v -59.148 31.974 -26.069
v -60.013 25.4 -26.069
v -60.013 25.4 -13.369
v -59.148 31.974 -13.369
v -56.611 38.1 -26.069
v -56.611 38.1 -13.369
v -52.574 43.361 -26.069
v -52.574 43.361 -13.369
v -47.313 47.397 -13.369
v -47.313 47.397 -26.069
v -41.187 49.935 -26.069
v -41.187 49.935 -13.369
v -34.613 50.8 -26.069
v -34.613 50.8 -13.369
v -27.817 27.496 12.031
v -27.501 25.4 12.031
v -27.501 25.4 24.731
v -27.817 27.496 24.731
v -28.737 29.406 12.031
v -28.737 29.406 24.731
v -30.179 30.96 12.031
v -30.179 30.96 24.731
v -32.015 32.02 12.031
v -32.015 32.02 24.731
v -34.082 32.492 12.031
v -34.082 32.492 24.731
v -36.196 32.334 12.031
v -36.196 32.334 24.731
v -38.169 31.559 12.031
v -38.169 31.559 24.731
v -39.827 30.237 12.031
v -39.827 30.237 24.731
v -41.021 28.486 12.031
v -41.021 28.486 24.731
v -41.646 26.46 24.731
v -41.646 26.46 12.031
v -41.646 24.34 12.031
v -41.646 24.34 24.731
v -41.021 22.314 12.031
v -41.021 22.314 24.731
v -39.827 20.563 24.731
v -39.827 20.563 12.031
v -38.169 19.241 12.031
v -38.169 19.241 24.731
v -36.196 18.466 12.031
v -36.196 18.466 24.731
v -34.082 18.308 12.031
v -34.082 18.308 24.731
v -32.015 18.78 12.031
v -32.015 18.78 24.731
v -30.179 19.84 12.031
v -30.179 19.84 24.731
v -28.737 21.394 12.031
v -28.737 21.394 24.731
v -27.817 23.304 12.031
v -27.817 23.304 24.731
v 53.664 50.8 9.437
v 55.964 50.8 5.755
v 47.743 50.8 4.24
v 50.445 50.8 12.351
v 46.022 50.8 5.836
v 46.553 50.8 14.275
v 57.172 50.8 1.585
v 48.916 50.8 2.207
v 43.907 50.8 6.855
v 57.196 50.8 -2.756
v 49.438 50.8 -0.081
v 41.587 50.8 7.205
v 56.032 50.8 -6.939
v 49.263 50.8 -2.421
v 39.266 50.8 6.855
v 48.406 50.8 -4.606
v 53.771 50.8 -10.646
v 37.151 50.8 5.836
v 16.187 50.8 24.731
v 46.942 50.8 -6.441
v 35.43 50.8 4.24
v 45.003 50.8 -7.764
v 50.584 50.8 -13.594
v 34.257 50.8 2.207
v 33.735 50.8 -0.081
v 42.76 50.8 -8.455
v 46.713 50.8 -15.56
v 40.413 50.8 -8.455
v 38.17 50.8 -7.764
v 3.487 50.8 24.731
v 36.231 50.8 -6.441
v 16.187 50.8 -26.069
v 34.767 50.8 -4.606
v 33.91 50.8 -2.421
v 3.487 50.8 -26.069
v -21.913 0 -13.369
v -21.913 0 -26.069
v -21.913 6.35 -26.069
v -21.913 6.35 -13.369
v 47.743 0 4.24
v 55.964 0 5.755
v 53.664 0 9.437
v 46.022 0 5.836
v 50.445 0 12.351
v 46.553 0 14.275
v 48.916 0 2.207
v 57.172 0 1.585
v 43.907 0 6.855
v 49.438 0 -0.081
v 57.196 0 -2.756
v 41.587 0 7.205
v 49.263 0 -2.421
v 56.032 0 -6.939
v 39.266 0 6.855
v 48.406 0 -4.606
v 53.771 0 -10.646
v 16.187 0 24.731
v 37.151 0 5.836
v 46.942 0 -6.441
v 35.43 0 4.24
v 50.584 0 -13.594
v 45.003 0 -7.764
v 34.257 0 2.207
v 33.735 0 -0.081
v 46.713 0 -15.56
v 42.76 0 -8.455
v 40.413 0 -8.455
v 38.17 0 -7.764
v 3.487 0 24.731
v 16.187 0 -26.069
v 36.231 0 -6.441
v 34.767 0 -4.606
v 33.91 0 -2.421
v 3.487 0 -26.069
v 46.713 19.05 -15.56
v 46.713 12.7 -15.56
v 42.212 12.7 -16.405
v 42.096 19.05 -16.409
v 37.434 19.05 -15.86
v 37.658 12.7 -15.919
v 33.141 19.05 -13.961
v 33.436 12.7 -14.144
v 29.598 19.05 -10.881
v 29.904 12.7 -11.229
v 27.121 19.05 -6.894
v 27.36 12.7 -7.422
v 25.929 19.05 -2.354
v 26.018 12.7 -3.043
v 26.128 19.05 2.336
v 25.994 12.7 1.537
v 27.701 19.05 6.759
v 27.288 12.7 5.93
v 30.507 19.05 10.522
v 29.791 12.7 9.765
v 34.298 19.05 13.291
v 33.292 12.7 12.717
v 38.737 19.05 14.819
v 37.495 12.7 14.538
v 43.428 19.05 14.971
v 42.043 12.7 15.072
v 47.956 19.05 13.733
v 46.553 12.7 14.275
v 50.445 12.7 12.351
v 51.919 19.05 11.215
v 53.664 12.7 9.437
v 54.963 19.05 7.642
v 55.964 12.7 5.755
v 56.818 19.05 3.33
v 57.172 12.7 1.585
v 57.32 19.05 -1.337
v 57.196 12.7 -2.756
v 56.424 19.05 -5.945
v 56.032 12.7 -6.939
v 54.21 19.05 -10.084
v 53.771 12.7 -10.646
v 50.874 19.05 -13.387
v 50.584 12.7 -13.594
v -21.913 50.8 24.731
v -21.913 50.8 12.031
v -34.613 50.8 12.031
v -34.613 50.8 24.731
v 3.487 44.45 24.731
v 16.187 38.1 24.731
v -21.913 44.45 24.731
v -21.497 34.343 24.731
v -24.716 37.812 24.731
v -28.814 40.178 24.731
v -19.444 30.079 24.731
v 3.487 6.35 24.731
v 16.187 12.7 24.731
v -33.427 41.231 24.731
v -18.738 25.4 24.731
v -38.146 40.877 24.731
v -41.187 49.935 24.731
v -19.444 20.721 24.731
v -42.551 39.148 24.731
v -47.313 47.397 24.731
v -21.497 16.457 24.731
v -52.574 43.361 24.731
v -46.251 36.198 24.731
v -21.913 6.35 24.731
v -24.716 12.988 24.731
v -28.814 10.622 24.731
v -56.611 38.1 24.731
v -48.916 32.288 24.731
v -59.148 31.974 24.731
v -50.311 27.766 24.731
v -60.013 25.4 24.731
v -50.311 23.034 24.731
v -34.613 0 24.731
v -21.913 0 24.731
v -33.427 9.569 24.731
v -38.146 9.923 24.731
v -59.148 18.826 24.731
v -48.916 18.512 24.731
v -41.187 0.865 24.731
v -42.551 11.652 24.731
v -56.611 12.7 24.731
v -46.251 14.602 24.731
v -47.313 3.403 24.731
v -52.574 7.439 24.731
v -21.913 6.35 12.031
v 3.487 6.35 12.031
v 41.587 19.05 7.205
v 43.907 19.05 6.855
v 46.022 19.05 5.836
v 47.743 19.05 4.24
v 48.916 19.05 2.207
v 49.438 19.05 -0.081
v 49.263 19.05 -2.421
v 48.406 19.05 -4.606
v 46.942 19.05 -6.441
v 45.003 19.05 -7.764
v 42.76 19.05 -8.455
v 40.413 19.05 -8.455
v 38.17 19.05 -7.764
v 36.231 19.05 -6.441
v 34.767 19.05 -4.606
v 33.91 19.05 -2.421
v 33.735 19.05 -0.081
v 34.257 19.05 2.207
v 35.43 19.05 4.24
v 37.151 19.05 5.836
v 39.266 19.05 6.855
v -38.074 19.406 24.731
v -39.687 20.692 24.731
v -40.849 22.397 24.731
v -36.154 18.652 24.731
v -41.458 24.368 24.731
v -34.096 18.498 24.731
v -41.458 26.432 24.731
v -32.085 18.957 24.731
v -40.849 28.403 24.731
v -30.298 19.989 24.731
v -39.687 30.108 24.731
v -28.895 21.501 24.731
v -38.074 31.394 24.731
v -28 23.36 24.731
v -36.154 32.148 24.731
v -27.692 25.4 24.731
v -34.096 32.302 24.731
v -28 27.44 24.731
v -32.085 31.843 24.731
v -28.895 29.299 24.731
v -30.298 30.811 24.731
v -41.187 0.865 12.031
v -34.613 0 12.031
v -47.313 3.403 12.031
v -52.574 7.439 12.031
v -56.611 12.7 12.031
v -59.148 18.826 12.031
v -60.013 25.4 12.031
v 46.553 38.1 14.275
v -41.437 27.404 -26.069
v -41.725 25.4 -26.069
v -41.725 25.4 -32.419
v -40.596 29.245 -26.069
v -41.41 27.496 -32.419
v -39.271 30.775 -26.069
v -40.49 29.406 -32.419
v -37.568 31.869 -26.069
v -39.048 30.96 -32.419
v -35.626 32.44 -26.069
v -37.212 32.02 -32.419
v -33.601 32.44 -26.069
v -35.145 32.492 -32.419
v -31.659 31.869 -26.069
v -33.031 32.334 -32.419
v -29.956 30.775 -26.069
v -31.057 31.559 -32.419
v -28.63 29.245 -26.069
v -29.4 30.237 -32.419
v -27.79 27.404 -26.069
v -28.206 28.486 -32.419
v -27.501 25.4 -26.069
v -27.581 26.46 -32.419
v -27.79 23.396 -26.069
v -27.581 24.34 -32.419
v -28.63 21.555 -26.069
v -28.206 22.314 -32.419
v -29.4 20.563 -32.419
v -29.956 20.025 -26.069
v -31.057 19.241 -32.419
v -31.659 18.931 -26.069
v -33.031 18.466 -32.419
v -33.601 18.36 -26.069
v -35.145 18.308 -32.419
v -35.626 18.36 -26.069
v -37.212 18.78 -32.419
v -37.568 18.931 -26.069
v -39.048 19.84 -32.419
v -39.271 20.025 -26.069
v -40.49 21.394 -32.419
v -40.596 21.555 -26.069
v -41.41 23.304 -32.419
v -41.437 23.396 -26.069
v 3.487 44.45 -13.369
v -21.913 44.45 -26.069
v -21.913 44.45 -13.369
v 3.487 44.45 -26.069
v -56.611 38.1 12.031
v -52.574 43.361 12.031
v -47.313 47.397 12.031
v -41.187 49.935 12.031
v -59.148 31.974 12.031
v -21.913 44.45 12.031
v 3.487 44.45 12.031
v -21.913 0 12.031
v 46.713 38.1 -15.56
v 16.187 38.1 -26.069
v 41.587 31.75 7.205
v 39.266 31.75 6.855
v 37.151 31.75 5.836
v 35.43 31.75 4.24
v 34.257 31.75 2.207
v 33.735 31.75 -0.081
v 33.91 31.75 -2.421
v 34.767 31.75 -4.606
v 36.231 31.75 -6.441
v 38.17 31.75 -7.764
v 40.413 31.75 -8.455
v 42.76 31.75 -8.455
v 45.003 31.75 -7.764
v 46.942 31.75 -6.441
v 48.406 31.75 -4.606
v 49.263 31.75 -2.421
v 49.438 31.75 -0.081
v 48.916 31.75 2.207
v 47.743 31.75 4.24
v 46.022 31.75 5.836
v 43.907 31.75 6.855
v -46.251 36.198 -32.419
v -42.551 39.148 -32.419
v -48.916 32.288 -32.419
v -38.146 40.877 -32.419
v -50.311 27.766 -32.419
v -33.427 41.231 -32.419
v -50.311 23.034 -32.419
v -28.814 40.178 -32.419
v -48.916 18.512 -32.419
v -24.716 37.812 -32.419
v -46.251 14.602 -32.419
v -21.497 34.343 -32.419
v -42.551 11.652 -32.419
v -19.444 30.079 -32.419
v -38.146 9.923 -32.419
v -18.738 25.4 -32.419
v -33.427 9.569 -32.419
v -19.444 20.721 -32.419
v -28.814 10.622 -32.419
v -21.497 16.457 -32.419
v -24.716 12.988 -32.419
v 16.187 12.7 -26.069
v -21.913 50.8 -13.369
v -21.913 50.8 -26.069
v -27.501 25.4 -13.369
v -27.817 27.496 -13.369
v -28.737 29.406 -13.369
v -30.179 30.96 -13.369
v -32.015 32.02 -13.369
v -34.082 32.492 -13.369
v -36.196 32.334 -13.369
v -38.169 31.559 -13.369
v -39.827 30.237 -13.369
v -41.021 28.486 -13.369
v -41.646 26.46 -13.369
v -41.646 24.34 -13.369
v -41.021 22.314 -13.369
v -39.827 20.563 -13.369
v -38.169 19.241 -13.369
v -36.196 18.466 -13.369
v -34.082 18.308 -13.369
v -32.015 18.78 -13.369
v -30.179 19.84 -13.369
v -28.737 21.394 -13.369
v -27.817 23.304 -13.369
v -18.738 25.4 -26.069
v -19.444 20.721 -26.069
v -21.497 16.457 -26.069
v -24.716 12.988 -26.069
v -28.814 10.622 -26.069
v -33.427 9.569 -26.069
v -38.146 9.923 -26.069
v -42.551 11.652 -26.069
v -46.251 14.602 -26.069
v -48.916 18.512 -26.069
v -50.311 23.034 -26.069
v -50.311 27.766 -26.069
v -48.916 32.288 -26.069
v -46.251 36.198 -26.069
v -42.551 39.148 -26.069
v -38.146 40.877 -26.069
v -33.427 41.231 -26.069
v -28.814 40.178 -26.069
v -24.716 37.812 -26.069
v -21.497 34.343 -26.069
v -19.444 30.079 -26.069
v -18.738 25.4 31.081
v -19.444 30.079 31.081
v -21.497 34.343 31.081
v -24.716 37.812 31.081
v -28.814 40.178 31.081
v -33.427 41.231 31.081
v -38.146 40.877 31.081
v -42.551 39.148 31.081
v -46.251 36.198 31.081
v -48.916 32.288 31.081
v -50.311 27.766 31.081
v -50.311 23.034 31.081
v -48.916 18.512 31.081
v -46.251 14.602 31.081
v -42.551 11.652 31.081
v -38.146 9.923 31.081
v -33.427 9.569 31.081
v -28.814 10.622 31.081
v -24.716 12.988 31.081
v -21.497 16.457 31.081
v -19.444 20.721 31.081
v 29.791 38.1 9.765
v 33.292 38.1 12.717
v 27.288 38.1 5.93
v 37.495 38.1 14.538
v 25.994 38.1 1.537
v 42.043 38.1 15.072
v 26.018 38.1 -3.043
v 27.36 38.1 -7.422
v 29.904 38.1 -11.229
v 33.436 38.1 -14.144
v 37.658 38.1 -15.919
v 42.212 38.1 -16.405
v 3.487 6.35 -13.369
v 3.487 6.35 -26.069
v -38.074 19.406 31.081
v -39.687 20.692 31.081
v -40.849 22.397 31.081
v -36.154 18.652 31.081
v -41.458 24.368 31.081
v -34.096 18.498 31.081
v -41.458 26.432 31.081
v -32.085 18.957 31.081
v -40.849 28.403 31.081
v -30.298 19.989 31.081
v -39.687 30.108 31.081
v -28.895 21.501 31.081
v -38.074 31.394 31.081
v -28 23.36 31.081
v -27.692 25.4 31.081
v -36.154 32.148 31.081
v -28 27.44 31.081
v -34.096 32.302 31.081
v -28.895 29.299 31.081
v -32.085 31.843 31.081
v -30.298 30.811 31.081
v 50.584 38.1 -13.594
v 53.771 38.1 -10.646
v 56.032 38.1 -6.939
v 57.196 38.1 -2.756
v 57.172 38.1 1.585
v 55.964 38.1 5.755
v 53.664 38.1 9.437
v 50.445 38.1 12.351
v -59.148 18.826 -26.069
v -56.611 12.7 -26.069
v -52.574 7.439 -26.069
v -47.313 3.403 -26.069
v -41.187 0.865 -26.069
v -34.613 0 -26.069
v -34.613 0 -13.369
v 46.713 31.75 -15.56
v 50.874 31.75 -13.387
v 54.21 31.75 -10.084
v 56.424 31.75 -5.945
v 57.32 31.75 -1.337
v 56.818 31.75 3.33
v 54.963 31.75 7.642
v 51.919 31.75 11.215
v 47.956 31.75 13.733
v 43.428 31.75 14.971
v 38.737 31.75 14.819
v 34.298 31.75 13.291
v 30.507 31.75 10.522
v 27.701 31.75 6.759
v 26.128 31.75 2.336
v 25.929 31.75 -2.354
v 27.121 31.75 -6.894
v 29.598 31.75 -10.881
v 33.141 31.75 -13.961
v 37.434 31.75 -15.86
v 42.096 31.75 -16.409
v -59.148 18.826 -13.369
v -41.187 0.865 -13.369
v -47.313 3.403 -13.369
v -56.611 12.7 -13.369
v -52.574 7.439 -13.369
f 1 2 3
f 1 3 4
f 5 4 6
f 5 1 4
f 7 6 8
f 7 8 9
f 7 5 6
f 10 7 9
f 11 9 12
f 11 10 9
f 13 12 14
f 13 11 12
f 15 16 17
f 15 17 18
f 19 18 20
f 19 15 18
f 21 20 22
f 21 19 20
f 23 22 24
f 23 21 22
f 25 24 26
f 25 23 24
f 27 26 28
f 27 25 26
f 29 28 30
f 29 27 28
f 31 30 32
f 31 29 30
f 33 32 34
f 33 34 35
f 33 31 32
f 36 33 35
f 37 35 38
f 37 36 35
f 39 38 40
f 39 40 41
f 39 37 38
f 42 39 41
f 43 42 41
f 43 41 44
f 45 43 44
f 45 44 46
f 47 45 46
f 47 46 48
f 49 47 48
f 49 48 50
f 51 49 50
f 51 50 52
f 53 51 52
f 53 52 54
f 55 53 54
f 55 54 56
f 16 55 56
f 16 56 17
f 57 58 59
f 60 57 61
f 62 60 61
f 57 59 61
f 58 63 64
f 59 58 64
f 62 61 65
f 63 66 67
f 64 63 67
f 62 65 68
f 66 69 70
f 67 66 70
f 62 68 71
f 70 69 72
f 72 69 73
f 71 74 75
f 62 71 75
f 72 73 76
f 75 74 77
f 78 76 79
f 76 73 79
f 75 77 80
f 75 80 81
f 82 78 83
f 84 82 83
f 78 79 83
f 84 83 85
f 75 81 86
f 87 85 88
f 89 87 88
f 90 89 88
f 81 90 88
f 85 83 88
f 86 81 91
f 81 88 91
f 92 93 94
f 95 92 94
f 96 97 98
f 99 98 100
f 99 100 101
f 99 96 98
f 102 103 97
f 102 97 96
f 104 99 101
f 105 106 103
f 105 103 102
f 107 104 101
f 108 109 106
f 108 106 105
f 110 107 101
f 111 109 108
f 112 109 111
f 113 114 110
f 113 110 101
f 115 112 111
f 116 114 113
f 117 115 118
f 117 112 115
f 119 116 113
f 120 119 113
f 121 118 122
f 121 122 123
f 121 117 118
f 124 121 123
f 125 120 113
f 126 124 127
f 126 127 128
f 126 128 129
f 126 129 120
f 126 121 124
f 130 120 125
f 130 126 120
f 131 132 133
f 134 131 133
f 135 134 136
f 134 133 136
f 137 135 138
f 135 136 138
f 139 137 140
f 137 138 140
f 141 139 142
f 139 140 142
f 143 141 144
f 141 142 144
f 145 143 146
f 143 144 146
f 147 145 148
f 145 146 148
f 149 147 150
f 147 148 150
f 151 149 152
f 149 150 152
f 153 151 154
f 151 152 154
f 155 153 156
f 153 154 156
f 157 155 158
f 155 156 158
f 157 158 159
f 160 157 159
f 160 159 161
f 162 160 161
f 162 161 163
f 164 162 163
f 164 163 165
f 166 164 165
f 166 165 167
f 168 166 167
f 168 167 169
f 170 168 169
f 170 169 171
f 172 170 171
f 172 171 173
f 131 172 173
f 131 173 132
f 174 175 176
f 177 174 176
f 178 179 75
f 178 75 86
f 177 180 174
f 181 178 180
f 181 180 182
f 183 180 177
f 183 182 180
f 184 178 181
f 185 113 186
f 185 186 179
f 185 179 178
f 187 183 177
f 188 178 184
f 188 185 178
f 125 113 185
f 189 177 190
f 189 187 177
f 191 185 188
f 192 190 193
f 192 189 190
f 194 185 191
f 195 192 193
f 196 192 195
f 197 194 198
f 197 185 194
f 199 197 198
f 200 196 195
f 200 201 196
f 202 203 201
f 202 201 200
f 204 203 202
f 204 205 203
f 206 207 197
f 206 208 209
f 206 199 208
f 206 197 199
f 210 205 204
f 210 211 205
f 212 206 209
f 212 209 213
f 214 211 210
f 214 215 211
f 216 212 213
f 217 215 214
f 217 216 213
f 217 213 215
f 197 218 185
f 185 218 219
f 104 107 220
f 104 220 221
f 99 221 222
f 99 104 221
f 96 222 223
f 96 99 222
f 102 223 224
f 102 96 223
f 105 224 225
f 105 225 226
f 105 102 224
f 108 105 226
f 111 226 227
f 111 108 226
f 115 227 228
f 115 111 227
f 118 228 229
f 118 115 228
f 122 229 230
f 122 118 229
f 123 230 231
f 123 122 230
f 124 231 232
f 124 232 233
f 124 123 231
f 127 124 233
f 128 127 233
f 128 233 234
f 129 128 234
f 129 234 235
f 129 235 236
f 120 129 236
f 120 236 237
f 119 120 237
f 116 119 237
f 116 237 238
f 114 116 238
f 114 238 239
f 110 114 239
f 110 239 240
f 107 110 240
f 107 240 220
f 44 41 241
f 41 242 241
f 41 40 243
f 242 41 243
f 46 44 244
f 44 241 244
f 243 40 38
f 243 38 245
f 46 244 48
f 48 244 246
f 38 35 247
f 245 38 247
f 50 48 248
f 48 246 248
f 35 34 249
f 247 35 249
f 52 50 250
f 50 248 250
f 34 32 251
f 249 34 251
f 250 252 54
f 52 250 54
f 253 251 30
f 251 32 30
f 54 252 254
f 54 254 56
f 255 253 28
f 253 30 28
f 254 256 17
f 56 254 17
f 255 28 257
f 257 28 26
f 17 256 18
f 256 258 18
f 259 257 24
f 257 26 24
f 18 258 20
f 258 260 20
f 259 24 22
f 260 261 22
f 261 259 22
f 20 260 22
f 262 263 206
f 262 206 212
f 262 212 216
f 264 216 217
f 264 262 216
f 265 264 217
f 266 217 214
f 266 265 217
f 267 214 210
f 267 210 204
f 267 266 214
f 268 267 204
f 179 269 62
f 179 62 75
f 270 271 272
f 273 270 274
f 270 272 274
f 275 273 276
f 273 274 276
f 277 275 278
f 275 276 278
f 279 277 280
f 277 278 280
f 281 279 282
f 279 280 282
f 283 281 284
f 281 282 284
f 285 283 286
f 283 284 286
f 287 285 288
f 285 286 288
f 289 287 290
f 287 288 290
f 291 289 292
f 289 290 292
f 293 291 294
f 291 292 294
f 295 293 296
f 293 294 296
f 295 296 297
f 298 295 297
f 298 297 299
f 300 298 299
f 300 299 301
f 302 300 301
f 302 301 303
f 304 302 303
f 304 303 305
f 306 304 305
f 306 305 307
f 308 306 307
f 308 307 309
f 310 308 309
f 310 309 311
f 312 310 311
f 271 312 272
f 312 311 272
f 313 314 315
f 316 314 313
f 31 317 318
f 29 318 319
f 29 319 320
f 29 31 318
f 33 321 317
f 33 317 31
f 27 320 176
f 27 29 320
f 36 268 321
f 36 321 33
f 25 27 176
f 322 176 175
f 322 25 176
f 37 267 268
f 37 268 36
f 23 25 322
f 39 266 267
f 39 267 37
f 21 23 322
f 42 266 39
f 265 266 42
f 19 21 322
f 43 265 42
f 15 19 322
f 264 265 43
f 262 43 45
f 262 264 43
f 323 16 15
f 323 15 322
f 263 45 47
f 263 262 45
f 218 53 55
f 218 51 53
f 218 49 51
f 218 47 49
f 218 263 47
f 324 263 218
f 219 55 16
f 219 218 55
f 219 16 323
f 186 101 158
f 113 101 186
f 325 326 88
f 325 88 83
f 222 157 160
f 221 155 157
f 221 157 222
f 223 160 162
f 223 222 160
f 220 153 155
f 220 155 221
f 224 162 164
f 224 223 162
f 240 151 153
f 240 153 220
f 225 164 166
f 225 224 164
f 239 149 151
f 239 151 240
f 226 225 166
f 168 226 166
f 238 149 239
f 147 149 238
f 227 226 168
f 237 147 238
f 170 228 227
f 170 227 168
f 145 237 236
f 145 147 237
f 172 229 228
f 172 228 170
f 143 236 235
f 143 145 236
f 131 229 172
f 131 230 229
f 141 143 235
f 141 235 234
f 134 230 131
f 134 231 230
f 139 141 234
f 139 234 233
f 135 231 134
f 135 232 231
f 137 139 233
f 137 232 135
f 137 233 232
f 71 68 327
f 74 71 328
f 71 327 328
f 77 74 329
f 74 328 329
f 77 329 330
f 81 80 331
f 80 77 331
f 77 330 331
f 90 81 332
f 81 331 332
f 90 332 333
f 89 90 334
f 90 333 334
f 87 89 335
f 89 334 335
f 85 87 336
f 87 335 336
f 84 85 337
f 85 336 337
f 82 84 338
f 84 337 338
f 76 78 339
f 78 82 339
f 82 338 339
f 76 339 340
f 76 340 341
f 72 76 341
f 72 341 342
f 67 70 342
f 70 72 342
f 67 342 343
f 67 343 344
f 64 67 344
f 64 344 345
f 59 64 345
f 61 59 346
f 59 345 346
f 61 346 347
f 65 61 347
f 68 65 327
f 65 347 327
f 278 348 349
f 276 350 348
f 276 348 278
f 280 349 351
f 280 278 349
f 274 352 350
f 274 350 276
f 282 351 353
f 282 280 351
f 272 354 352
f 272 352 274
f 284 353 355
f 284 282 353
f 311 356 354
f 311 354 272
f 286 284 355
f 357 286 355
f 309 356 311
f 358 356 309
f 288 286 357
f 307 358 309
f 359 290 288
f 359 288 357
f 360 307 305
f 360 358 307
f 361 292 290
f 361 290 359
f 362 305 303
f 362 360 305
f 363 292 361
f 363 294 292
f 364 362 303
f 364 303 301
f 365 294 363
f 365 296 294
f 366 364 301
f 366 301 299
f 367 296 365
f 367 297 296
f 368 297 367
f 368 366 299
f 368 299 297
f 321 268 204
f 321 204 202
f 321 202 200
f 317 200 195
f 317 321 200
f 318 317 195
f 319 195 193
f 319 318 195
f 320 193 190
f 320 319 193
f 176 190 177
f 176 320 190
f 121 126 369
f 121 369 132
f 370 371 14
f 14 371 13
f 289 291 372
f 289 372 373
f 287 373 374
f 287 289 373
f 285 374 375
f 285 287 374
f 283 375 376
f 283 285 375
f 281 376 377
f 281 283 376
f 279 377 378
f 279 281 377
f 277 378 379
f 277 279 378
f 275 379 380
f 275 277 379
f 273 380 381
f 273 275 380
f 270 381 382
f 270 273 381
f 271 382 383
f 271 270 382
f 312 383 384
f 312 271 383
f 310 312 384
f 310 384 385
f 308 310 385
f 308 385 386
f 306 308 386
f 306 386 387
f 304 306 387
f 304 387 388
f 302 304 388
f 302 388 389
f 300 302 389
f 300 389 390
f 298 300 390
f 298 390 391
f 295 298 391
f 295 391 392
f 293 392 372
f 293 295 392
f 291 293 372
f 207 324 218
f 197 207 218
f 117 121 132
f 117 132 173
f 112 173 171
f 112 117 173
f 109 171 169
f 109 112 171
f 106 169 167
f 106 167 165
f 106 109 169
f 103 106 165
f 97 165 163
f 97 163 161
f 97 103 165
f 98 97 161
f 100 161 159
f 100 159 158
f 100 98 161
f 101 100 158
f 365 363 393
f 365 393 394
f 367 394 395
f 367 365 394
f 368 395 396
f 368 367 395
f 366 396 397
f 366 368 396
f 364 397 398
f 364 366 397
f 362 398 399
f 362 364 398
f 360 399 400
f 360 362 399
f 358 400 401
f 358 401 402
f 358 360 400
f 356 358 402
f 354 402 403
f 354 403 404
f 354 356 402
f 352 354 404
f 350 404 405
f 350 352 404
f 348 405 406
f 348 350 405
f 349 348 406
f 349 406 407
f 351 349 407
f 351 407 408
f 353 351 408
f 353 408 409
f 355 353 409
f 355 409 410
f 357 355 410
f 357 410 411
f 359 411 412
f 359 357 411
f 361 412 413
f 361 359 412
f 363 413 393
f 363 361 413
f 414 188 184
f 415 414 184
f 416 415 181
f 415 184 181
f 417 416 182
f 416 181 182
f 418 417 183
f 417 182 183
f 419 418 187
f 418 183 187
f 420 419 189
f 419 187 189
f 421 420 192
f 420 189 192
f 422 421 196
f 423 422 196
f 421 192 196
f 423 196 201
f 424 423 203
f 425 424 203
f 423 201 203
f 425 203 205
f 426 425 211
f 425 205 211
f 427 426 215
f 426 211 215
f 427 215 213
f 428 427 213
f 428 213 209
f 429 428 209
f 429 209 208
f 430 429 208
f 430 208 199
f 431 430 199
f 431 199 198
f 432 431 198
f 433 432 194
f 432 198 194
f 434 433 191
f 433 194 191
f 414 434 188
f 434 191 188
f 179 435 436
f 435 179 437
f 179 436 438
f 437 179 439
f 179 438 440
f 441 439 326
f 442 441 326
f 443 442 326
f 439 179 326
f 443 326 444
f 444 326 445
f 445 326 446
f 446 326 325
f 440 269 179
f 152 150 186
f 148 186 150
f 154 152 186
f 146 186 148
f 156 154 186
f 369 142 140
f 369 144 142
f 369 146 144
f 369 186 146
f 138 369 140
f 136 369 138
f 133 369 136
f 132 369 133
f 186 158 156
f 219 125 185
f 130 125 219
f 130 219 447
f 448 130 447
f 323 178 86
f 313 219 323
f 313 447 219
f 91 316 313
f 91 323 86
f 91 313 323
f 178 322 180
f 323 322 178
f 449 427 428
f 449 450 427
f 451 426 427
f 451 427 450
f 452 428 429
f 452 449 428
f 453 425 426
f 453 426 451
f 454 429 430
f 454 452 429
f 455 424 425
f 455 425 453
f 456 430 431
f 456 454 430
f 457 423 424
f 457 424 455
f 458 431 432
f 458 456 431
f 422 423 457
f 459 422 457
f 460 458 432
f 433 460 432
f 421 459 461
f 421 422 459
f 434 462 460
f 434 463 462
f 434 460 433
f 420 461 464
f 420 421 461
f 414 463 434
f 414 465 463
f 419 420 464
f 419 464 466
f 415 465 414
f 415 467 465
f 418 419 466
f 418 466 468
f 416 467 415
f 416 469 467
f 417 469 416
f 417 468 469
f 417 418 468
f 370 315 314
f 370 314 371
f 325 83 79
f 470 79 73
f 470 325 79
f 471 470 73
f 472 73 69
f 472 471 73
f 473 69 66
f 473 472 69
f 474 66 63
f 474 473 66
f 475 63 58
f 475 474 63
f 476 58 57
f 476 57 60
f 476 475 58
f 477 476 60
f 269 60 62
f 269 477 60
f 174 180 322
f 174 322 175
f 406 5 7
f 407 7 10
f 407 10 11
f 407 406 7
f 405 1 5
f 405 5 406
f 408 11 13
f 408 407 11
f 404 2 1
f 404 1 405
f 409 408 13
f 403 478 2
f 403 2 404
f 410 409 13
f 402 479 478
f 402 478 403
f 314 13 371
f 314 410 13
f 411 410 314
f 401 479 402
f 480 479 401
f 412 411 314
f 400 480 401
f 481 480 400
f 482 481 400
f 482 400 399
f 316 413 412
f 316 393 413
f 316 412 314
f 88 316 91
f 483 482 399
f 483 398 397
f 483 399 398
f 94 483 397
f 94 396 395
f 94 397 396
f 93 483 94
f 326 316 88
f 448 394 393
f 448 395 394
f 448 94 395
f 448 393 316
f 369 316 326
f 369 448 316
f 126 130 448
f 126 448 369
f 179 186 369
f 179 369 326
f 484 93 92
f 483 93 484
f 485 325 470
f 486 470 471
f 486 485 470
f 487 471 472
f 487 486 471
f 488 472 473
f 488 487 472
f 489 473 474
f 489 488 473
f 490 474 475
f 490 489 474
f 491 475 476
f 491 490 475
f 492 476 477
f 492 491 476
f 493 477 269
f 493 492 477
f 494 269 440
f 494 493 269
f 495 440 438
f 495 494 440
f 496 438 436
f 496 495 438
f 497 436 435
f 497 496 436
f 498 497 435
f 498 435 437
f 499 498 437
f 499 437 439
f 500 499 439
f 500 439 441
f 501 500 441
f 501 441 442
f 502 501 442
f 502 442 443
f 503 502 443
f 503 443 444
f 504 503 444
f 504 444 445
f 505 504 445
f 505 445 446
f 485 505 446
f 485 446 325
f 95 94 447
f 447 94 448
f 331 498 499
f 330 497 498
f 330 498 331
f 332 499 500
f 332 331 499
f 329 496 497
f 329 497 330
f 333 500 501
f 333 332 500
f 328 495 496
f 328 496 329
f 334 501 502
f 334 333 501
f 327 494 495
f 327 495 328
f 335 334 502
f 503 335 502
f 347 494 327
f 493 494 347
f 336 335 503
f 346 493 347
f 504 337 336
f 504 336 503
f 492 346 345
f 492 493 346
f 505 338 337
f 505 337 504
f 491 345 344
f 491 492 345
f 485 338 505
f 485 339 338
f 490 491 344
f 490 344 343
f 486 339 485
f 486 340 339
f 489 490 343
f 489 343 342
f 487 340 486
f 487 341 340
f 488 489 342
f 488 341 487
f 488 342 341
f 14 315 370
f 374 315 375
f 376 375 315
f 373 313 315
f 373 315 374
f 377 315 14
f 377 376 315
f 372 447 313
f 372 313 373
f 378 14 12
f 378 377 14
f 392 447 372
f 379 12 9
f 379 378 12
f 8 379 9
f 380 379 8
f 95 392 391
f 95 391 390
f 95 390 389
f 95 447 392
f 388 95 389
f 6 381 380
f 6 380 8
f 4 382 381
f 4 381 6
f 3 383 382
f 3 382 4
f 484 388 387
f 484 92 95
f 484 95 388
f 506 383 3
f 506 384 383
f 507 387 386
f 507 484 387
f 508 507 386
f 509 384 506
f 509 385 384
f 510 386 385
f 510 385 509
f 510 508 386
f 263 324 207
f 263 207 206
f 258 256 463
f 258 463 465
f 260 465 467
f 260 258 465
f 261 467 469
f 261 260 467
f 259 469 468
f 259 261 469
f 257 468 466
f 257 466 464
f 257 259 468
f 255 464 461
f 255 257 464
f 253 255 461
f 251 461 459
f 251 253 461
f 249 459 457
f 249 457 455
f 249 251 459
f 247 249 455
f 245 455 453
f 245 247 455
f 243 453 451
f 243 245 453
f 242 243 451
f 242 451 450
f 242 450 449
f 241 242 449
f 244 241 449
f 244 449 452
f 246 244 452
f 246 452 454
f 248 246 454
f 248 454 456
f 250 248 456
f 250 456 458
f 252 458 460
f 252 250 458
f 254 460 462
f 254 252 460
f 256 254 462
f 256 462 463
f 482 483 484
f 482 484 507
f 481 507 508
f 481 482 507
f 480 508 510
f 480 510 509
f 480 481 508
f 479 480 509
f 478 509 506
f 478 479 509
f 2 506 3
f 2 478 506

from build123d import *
from build123d.topology import SkipClean

# Parameters (mm, degrees)
SKETCH1_R           = 7.874
BOSS_EXTRUDE1_DEPTH = 50.8
SKETCH2_W           = 25.4
SKETCH2_H           = 6.35
SKETCH2_W_2         = 49.568192559
SKETCH2_H_2         = 25.4
SKETCH2_R           = 7.112
CUT_EXTRUDE1_DEPTH  = 86.106
SKETCH3_R           = 15.875
SKETCH3_R_2         = 6.921426928
BOSS_EXTRUDE2_DEPTH = 6.35
SKETCH4_R           = 15.875
SKETCH4_R_2         = 7.112
BOSS_EXTRUDE3_DEPTH = 6.35
SKETCH5_R           = 15.748
SKETCH5_R_2         = 7.874
BOSS_EXTRUDE4_DEPTH = 6.35
BOSS_EXTRUDE5_START = 6.35
SKETCH6_R           = 15.748
SKETCH6_R_2         = 7.874
BOSS_EXTRUDE5_DEPTH = 6.35


with BuildPart() as part:
    # Sketch1 → Boss-Extrude1 (new body)
    with BuildSketch(Plane(origin=(0, 0, 0), x_dir=(1, 0, 0), z_dir=(0, 1, 0))):
        with BuildLine():
            Line((-60.013493944, 26.069313577), (16.186506056, 26.069313577))
            Line((16.186506056, 26.069313577), (46.712972556, 15.559540077))
            ThreePointArc((46.712972556, 15.559540077), (57.334279676, 0.584874102), (46.55299975, -14.27503132))
            Line((46.55299975, -14.27503132), (16.186506056, -24.730686423))
            Line((16.186506056, -24.730686423), (-60.013493944, -24.730686423))
            Line((-60.013493944, -24.730686423), (-60.013493944, -12.030686423))
            Line((-60.013493944, -12.030686423), (3.486506056, -12.030686423))
            Line((3.486506056, -12.030686423), (3.486506056, 13.369313577))
            Line((3.486506056, 13.369313577), (-60.013493944, 13.369313577))
            Line((-60.013493944, 13.369313577), (-60.013493944, 26.069313577))
        make_face()
        with Locations((41.586506056, 0.669313577)):
            Circle(SKETCH1_R, mode=Mode.SUBTRACT)
    extrude(amount=BOSS_EXTRUDE1_DEPTH)

    # Sketch2 → Cut-Extrude1 (cut)
    with BuildSketch(Plane.XY.offset(24.730686423)):
        with BuildLine():
            ThreePointArc((-60.013493944, 25.4), (-52.574006186, 43.360512242), (-34.613493944, 50.8))
            Line((-34.613493944, 50.8), (-60.013493944, 50.8))
            Line((-60.013493944, 50.8), (-60.013493944, 25.4))
        make_face()
        with BuildLine():
            ThreePointArc((-34.613493944, 0), (-52.574006186, 7.439487758), (-60.013493944, 25.4))
            Line((-60.013493944, 25.4), (-60.013493944, 0))
            Line((-60.013493944, 0), (-34.613493944, 0))
        make_face()
        with Locations((-9.213493944, 47.625)):
            Rectangle(SKETCH2_W, SKETCH2_H)
        with Locations((-9.213493944, 3.175)):
            Rectangle(SKETCH2_W, SKETCH2_H)
        with Locations((40.970602336, 25.4)):
            Rectangle(SKETCH2_W_2, SKETCH2_H_2)
        with Locations((-34.613493944, 25.4)):
            Circle(SKETCH2_R)
    extrude(amount=-CUT_EXTRUDE1_DEPTH, mode=Mode.SUBTRACT)

    # Sketch3 → Boss-Extrude2 (add)
    with BuildSketch(Plane.XY.offset(24.730686423)):
        with Locations((-34.613493944, 25.4)):
            Circle(SKETCH3_R)
        with Locations((-34.613493944, 25.4)):
            Circle(SKETCH3_R_2, mode=Mode.SUBTRACT)
    extrude(amount=BOSS_EXTRUDE2_DEPTH)

    # Sketch4 → Boss-Extrude3 (add)
    with SkipClean():  # the faces are left unmerged after this step: merging them gives an invalid solid
        with BuildSketch(Plane(origin=(0, 0, -26.069313577), x_dir=(-1, 0, 0), z_dir=(0, 0, -1))):
            with Locations((34.613493944, 25.4)):
                Circle(SKETCH4_R)
            with Locations((34.613493944, 25.4)):
                Circle(SKETCH4_R_2, mode=Mode.SUBTRACT)
        extrude(amount=BOSS_EXTRUDE3_DEPTH)

    # Sketch5 → Boss-Extrude4 (add)
    with SkipClean():  # the faces are left unmerged after this step: merging them gives an invalid solid
        with BuildSketch(Plane(origin=(0, 12.7, 0), x_dir=(1, 0, 0), z_dir=(0, 1, 0))):
            with Locations((41.586506056, 0.669313577)):
                Circle(SKETCH5_R)
            with Locations((41.586506056, 0.669313577)):
                Circle(SKETCH5_R_2, mode=Mode.SUBTRACT)
        extrude(amount=BOSS_EXTRUDE4_DEPTH)
    add(part.part.scale(1), mode=Mode.REPLACE)  # the faces are merged on a copy

    # Sketch6 → Boss-Extrude5 (add)
    with BuildSketch(Plane.XZ.offset(-38.1).offset(BOSS_EXTRUDE5_START)):
        with Locations((41.586506056, -0.669313577)):
            Circle(SKETCH6_R)
        with Locations((41.586506056, -0.669313577)):
            Circle(SKETCH6_R_2, mode=Mode.SUBTRACT)
    extrude(amount=-BOSS_EXTRUDE5_DEPTH)


solid = part.part
